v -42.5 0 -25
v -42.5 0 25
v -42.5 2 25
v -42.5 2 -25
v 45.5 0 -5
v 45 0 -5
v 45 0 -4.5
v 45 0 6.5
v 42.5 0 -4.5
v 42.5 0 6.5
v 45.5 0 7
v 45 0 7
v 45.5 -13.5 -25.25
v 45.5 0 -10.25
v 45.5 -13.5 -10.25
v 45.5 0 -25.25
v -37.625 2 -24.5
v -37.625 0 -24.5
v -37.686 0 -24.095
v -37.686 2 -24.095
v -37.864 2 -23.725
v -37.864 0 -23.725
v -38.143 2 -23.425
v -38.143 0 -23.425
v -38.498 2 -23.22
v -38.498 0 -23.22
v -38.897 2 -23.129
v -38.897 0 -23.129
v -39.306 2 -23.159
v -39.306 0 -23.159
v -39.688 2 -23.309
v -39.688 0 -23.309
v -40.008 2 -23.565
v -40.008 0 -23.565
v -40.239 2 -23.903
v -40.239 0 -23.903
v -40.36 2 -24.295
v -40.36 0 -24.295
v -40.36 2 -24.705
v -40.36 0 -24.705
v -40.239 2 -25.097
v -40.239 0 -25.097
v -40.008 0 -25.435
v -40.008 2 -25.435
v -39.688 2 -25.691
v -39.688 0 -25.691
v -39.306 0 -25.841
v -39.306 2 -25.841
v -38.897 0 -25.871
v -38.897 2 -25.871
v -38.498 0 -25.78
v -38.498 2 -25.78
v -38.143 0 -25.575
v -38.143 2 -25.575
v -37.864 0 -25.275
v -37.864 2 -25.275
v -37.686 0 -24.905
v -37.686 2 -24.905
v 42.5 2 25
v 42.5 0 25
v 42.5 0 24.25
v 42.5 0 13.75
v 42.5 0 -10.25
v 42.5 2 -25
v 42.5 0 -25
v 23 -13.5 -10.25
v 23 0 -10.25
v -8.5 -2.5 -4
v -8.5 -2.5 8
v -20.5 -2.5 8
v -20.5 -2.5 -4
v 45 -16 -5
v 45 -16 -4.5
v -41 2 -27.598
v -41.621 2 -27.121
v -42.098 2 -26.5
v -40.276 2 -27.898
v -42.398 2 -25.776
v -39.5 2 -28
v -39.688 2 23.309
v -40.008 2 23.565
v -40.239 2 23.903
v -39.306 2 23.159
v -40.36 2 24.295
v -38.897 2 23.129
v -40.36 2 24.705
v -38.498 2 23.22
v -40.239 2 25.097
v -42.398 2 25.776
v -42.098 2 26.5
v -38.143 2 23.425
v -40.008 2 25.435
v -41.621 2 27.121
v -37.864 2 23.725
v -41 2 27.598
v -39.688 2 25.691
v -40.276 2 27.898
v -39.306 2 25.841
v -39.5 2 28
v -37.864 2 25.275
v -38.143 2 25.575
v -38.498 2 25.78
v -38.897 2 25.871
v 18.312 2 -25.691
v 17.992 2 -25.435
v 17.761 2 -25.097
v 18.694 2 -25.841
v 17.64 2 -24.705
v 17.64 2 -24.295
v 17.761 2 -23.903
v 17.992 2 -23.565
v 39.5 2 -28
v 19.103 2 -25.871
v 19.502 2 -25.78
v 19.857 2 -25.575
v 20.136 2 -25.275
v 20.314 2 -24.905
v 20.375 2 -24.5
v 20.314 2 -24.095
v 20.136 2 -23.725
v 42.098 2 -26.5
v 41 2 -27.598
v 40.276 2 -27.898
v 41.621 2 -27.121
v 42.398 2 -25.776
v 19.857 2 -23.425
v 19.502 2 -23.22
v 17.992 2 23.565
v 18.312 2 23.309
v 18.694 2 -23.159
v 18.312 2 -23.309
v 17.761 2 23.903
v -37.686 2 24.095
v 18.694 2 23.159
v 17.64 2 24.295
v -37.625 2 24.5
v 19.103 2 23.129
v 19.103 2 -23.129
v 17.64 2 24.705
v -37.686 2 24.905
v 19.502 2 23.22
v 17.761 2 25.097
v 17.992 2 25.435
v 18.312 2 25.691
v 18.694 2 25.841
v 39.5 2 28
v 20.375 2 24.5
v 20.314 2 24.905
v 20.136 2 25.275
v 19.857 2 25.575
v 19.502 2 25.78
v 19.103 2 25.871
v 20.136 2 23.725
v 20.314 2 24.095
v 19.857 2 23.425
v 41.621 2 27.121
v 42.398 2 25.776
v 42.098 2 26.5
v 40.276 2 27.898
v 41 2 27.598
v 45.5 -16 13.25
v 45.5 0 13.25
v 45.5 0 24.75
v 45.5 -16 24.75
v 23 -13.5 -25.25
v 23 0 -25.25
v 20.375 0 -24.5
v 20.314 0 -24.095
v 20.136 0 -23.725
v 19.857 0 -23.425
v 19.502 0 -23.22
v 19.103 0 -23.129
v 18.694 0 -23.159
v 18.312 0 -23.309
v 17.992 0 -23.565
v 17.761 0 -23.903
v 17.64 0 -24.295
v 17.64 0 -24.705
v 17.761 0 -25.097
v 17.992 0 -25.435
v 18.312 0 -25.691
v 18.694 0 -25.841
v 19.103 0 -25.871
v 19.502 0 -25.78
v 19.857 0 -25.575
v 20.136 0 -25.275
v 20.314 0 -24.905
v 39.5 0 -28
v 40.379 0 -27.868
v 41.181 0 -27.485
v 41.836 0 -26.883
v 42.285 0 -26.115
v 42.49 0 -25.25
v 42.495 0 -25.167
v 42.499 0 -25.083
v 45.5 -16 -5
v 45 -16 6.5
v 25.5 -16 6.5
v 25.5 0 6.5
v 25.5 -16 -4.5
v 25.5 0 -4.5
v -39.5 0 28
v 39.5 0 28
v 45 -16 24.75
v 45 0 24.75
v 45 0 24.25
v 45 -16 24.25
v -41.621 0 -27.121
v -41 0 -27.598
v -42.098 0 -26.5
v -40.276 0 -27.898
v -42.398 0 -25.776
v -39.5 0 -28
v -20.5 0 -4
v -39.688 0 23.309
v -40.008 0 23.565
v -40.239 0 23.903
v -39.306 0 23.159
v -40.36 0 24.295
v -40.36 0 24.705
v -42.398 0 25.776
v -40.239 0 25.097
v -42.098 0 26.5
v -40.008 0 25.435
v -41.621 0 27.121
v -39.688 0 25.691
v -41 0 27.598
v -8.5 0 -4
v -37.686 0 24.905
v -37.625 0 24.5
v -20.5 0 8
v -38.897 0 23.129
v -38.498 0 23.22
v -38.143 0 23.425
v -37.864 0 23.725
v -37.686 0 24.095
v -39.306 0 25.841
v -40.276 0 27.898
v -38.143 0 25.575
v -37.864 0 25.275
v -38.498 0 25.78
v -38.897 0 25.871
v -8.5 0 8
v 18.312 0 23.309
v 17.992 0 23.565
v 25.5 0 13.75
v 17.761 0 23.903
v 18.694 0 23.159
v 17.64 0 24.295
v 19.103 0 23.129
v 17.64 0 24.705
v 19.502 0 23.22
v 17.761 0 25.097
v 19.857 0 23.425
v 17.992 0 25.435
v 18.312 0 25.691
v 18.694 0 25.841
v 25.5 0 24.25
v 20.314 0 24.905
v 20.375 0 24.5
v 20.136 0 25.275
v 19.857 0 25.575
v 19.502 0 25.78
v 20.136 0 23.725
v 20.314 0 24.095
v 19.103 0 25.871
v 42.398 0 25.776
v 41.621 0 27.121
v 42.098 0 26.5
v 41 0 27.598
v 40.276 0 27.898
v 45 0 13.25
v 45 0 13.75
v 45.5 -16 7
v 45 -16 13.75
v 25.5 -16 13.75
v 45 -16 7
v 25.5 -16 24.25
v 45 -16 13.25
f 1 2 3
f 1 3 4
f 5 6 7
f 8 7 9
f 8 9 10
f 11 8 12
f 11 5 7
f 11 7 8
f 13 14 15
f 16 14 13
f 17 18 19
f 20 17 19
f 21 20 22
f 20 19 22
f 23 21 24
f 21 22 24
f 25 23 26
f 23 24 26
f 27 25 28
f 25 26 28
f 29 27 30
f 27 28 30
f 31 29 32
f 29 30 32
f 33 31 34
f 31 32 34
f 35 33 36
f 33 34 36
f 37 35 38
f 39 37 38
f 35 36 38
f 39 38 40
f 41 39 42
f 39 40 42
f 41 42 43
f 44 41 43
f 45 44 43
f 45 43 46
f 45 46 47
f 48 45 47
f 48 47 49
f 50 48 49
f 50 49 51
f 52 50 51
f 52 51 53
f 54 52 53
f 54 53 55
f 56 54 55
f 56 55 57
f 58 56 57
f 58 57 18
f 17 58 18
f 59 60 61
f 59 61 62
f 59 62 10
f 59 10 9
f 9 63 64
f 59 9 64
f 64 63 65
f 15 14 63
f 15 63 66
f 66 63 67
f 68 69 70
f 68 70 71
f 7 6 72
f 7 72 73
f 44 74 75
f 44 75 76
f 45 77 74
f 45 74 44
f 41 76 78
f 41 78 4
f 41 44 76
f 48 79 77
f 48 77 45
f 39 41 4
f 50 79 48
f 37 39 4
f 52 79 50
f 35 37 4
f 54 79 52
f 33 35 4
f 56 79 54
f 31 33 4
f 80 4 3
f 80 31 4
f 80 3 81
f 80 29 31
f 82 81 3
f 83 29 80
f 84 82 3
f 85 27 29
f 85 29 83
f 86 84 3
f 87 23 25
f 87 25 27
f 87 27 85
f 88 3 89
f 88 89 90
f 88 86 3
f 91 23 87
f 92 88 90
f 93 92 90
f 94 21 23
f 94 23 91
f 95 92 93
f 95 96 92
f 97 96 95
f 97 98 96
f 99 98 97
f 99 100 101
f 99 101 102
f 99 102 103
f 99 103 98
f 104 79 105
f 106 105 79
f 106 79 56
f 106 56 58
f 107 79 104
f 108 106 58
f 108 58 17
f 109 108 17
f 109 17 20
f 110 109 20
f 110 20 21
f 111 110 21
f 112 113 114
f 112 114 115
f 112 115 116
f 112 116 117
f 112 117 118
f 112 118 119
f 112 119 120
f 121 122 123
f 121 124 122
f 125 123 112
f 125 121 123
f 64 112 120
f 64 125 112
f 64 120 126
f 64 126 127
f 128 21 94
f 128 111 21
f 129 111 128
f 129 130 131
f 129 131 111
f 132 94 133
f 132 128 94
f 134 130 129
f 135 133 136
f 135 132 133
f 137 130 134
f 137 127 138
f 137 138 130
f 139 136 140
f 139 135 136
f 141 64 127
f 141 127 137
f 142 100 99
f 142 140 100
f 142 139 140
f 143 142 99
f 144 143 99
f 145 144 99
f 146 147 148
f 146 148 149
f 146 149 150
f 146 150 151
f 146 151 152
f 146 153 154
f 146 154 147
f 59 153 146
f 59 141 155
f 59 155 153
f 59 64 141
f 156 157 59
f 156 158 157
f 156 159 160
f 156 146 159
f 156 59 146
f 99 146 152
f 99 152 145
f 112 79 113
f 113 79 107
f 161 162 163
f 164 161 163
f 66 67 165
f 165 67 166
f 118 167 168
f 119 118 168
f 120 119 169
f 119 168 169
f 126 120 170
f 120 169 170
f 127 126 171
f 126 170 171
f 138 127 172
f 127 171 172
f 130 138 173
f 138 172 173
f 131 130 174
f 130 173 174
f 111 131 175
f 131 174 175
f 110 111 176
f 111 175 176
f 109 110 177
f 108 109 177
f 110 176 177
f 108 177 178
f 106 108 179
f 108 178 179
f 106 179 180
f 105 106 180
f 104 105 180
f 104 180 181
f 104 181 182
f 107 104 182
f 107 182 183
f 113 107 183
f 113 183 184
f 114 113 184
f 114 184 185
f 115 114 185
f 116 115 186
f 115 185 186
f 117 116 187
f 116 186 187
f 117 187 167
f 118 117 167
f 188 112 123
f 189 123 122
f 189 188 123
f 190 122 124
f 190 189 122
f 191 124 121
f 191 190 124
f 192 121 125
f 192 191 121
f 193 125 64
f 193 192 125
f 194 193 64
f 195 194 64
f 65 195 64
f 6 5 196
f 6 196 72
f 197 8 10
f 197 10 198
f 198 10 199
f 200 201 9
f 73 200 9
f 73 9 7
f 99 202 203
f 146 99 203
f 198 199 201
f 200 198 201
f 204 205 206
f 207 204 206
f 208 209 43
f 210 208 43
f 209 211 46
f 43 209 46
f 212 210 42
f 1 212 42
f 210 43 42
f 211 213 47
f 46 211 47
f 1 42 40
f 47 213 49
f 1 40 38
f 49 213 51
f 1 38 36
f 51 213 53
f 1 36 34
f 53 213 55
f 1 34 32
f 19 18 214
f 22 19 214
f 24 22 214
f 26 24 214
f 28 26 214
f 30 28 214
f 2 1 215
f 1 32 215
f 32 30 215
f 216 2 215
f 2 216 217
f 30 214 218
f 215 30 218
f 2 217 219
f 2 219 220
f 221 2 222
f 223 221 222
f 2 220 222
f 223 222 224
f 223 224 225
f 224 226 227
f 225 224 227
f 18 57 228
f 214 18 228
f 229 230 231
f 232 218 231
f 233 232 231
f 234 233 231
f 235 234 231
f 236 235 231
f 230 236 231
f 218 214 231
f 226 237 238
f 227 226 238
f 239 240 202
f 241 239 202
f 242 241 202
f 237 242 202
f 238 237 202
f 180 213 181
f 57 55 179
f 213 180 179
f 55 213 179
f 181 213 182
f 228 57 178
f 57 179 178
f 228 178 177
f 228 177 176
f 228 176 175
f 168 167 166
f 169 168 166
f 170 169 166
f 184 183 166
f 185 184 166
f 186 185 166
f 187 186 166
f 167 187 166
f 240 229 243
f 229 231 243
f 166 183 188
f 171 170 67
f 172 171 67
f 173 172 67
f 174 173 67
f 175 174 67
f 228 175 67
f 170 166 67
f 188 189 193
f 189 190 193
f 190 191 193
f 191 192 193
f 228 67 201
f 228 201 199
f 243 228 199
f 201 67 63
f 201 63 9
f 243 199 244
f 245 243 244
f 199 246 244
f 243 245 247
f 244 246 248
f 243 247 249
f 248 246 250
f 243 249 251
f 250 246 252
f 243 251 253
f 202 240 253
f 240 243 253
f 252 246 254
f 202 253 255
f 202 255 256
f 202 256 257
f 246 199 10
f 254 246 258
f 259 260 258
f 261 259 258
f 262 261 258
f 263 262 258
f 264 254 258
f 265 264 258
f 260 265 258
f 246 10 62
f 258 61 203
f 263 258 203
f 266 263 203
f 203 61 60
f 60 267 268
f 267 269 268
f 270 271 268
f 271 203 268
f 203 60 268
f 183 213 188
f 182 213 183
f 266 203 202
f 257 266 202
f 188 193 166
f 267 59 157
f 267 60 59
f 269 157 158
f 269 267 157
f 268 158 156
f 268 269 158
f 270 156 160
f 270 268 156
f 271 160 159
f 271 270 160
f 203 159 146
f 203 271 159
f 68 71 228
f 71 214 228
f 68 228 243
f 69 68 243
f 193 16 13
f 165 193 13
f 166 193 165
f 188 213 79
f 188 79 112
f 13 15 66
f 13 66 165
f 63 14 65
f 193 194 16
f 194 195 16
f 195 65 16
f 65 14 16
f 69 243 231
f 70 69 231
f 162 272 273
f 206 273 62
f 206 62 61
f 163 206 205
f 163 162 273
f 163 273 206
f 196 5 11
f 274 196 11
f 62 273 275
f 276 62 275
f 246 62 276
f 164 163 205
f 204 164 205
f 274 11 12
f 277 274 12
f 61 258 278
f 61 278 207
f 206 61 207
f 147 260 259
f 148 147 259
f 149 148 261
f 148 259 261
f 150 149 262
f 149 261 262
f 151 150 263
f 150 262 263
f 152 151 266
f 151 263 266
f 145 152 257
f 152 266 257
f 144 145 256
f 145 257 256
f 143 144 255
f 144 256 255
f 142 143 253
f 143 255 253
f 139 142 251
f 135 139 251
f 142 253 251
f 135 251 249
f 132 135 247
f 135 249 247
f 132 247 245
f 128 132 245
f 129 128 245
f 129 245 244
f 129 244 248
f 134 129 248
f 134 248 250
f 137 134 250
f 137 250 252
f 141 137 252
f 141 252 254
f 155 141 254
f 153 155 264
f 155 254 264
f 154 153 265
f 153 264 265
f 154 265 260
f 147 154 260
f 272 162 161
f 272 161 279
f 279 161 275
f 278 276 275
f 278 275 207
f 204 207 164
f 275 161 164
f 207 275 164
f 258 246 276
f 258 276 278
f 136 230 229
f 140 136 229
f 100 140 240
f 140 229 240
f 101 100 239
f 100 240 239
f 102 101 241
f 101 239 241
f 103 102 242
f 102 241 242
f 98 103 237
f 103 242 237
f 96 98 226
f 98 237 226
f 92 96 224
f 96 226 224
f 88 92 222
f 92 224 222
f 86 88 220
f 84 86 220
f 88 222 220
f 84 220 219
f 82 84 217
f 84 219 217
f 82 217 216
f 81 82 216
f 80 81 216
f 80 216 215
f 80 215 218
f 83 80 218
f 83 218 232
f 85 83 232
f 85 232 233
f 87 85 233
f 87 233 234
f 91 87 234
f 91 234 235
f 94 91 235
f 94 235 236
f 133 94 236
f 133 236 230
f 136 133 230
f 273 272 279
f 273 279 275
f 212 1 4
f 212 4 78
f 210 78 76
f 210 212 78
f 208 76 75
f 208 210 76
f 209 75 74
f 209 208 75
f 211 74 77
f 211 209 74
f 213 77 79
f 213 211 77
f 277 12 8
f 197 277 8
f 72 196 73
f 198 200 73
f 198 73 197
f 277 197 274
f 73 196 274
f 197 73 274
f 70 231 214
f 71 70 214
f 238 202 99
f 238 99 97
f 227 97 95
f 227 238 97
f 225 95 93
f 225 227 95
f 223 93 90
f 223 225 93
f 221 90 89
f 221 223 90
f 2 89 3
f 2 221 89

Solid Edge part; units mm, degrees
sketch "Sketch1" plane through (0, 0, 0) normal (0, -1, 0) x (1, 0, 0)
  line L0 (-39.5, 28) -> (39.5, 28)
  arc A0 (42.5, 25) -> (39.5, 28) centre (39.5, 25) ccw
  line L1 (42.5, 25) -> (42.5, -25)
  arc A1 (39.5, -28) -> (42.5, -25) centre (39.5, -25) ccw
  line L2 (-39.5, -28) -> (39.5, -28)
  arc A2 (-39.5, -28) -> (-42.5, -25) centre (-39.5, -25) cw
  line L3 (-42.5, 25) -> (-42.5, -25)
  arc A3 (-42.5, 25) -> (-39.5, 28) centre (-39.5, 25) cw
  circle A4 centre (19, 24.5) radius 1.375
  circle A5 centre (19, -24.5) radius 1.375
  circle A6 centre (-39, 24.5) radius 1.375
  circle A7 centre (-39, -24.5) radius 1.375
extrude "Protrusion1" add sketch "Sketch1" against normal blind 2
sketch "Sketch2" plane through (0, 0, 0) normal (0, -1, 0) x (1, 0, 0)
  line L0 (45.5, -10.25) -> (23, -10.25)
  line L1 (23, -10.25) -> (23, -25.25)
  line L2 (45.5, -25.25) -> (23, -25.25)
  line L3 (45.5, -10.25) -> (45.5, -25.25)
extrude "RJ45" add sketch "Sketch2" along normal blind 13.5
sketch "Sketch3" plane through (0, 0, 0) normal (0, -1, 0) x (1, 0, 0)
  line L0 (45.5, 24.25) -> (45.5, 13.75)
  line L1 (45.5, 13.75) -> (45.5, 13.25)
  line L2 (45.5, 13.25) -> (45, 13.25)
  line L3 (45, 13.25) -> (45, 13.75)
  line L4 (45, 13.75) -> (25.5, 13.75)
  line L5 (25.5, 13.75) -> (25.5, 24.25)
  line L6 (25.5, 24.25) -> (45, 24.25)
  line L7 (45, 24.75) -> (45, 24.25)
  line L8 (45.5, 24.75) -> (45, 24.75)
  line L9 (45.5, 24.25) -> (45.5, 24.75)
  line L10 (45.5, 6.5) -> (45.5, -4.5)
  line L11 (45.5, -4.5) -> (45.5, -5)
  line L12 (45.5, -5) -> (45, -5)
  line L13 (45, -5) -> (45, -4.5)
  line L14 (25.5, -4.5) -> (45, -4.5)
  line L15 (25.5, 6.5) -> (25.5, -4.5)
  line L16 (45, 6.5) -> (25.5, 6.5)
  line L17 (45, 7) -> (45, 6.5)
  line L18 (45.5, 7) -> (45, 7)
  line L19 (45.5, 6.5) -> (45.5, 7)
extrude "USB" add sketch "Sketch3" along normal blind 16
sketch "Sketch4" plane through (0, 0, 0) normal (0, -1, 0) x (1, 0, 0)
  line L0 (-8.5, 8) -> (-20.5, 8)
  line L1 (-20.5, 8) -> (-20.5, -4)
  line L2 (-20.5, -4) -> (-8.5, -4)
  line L3 (-8.5, -4) -> (-8.5, 8)
extrude "ProtrusiónExtruida_5" add sketch "Sketch4" along normal blind 2.5
